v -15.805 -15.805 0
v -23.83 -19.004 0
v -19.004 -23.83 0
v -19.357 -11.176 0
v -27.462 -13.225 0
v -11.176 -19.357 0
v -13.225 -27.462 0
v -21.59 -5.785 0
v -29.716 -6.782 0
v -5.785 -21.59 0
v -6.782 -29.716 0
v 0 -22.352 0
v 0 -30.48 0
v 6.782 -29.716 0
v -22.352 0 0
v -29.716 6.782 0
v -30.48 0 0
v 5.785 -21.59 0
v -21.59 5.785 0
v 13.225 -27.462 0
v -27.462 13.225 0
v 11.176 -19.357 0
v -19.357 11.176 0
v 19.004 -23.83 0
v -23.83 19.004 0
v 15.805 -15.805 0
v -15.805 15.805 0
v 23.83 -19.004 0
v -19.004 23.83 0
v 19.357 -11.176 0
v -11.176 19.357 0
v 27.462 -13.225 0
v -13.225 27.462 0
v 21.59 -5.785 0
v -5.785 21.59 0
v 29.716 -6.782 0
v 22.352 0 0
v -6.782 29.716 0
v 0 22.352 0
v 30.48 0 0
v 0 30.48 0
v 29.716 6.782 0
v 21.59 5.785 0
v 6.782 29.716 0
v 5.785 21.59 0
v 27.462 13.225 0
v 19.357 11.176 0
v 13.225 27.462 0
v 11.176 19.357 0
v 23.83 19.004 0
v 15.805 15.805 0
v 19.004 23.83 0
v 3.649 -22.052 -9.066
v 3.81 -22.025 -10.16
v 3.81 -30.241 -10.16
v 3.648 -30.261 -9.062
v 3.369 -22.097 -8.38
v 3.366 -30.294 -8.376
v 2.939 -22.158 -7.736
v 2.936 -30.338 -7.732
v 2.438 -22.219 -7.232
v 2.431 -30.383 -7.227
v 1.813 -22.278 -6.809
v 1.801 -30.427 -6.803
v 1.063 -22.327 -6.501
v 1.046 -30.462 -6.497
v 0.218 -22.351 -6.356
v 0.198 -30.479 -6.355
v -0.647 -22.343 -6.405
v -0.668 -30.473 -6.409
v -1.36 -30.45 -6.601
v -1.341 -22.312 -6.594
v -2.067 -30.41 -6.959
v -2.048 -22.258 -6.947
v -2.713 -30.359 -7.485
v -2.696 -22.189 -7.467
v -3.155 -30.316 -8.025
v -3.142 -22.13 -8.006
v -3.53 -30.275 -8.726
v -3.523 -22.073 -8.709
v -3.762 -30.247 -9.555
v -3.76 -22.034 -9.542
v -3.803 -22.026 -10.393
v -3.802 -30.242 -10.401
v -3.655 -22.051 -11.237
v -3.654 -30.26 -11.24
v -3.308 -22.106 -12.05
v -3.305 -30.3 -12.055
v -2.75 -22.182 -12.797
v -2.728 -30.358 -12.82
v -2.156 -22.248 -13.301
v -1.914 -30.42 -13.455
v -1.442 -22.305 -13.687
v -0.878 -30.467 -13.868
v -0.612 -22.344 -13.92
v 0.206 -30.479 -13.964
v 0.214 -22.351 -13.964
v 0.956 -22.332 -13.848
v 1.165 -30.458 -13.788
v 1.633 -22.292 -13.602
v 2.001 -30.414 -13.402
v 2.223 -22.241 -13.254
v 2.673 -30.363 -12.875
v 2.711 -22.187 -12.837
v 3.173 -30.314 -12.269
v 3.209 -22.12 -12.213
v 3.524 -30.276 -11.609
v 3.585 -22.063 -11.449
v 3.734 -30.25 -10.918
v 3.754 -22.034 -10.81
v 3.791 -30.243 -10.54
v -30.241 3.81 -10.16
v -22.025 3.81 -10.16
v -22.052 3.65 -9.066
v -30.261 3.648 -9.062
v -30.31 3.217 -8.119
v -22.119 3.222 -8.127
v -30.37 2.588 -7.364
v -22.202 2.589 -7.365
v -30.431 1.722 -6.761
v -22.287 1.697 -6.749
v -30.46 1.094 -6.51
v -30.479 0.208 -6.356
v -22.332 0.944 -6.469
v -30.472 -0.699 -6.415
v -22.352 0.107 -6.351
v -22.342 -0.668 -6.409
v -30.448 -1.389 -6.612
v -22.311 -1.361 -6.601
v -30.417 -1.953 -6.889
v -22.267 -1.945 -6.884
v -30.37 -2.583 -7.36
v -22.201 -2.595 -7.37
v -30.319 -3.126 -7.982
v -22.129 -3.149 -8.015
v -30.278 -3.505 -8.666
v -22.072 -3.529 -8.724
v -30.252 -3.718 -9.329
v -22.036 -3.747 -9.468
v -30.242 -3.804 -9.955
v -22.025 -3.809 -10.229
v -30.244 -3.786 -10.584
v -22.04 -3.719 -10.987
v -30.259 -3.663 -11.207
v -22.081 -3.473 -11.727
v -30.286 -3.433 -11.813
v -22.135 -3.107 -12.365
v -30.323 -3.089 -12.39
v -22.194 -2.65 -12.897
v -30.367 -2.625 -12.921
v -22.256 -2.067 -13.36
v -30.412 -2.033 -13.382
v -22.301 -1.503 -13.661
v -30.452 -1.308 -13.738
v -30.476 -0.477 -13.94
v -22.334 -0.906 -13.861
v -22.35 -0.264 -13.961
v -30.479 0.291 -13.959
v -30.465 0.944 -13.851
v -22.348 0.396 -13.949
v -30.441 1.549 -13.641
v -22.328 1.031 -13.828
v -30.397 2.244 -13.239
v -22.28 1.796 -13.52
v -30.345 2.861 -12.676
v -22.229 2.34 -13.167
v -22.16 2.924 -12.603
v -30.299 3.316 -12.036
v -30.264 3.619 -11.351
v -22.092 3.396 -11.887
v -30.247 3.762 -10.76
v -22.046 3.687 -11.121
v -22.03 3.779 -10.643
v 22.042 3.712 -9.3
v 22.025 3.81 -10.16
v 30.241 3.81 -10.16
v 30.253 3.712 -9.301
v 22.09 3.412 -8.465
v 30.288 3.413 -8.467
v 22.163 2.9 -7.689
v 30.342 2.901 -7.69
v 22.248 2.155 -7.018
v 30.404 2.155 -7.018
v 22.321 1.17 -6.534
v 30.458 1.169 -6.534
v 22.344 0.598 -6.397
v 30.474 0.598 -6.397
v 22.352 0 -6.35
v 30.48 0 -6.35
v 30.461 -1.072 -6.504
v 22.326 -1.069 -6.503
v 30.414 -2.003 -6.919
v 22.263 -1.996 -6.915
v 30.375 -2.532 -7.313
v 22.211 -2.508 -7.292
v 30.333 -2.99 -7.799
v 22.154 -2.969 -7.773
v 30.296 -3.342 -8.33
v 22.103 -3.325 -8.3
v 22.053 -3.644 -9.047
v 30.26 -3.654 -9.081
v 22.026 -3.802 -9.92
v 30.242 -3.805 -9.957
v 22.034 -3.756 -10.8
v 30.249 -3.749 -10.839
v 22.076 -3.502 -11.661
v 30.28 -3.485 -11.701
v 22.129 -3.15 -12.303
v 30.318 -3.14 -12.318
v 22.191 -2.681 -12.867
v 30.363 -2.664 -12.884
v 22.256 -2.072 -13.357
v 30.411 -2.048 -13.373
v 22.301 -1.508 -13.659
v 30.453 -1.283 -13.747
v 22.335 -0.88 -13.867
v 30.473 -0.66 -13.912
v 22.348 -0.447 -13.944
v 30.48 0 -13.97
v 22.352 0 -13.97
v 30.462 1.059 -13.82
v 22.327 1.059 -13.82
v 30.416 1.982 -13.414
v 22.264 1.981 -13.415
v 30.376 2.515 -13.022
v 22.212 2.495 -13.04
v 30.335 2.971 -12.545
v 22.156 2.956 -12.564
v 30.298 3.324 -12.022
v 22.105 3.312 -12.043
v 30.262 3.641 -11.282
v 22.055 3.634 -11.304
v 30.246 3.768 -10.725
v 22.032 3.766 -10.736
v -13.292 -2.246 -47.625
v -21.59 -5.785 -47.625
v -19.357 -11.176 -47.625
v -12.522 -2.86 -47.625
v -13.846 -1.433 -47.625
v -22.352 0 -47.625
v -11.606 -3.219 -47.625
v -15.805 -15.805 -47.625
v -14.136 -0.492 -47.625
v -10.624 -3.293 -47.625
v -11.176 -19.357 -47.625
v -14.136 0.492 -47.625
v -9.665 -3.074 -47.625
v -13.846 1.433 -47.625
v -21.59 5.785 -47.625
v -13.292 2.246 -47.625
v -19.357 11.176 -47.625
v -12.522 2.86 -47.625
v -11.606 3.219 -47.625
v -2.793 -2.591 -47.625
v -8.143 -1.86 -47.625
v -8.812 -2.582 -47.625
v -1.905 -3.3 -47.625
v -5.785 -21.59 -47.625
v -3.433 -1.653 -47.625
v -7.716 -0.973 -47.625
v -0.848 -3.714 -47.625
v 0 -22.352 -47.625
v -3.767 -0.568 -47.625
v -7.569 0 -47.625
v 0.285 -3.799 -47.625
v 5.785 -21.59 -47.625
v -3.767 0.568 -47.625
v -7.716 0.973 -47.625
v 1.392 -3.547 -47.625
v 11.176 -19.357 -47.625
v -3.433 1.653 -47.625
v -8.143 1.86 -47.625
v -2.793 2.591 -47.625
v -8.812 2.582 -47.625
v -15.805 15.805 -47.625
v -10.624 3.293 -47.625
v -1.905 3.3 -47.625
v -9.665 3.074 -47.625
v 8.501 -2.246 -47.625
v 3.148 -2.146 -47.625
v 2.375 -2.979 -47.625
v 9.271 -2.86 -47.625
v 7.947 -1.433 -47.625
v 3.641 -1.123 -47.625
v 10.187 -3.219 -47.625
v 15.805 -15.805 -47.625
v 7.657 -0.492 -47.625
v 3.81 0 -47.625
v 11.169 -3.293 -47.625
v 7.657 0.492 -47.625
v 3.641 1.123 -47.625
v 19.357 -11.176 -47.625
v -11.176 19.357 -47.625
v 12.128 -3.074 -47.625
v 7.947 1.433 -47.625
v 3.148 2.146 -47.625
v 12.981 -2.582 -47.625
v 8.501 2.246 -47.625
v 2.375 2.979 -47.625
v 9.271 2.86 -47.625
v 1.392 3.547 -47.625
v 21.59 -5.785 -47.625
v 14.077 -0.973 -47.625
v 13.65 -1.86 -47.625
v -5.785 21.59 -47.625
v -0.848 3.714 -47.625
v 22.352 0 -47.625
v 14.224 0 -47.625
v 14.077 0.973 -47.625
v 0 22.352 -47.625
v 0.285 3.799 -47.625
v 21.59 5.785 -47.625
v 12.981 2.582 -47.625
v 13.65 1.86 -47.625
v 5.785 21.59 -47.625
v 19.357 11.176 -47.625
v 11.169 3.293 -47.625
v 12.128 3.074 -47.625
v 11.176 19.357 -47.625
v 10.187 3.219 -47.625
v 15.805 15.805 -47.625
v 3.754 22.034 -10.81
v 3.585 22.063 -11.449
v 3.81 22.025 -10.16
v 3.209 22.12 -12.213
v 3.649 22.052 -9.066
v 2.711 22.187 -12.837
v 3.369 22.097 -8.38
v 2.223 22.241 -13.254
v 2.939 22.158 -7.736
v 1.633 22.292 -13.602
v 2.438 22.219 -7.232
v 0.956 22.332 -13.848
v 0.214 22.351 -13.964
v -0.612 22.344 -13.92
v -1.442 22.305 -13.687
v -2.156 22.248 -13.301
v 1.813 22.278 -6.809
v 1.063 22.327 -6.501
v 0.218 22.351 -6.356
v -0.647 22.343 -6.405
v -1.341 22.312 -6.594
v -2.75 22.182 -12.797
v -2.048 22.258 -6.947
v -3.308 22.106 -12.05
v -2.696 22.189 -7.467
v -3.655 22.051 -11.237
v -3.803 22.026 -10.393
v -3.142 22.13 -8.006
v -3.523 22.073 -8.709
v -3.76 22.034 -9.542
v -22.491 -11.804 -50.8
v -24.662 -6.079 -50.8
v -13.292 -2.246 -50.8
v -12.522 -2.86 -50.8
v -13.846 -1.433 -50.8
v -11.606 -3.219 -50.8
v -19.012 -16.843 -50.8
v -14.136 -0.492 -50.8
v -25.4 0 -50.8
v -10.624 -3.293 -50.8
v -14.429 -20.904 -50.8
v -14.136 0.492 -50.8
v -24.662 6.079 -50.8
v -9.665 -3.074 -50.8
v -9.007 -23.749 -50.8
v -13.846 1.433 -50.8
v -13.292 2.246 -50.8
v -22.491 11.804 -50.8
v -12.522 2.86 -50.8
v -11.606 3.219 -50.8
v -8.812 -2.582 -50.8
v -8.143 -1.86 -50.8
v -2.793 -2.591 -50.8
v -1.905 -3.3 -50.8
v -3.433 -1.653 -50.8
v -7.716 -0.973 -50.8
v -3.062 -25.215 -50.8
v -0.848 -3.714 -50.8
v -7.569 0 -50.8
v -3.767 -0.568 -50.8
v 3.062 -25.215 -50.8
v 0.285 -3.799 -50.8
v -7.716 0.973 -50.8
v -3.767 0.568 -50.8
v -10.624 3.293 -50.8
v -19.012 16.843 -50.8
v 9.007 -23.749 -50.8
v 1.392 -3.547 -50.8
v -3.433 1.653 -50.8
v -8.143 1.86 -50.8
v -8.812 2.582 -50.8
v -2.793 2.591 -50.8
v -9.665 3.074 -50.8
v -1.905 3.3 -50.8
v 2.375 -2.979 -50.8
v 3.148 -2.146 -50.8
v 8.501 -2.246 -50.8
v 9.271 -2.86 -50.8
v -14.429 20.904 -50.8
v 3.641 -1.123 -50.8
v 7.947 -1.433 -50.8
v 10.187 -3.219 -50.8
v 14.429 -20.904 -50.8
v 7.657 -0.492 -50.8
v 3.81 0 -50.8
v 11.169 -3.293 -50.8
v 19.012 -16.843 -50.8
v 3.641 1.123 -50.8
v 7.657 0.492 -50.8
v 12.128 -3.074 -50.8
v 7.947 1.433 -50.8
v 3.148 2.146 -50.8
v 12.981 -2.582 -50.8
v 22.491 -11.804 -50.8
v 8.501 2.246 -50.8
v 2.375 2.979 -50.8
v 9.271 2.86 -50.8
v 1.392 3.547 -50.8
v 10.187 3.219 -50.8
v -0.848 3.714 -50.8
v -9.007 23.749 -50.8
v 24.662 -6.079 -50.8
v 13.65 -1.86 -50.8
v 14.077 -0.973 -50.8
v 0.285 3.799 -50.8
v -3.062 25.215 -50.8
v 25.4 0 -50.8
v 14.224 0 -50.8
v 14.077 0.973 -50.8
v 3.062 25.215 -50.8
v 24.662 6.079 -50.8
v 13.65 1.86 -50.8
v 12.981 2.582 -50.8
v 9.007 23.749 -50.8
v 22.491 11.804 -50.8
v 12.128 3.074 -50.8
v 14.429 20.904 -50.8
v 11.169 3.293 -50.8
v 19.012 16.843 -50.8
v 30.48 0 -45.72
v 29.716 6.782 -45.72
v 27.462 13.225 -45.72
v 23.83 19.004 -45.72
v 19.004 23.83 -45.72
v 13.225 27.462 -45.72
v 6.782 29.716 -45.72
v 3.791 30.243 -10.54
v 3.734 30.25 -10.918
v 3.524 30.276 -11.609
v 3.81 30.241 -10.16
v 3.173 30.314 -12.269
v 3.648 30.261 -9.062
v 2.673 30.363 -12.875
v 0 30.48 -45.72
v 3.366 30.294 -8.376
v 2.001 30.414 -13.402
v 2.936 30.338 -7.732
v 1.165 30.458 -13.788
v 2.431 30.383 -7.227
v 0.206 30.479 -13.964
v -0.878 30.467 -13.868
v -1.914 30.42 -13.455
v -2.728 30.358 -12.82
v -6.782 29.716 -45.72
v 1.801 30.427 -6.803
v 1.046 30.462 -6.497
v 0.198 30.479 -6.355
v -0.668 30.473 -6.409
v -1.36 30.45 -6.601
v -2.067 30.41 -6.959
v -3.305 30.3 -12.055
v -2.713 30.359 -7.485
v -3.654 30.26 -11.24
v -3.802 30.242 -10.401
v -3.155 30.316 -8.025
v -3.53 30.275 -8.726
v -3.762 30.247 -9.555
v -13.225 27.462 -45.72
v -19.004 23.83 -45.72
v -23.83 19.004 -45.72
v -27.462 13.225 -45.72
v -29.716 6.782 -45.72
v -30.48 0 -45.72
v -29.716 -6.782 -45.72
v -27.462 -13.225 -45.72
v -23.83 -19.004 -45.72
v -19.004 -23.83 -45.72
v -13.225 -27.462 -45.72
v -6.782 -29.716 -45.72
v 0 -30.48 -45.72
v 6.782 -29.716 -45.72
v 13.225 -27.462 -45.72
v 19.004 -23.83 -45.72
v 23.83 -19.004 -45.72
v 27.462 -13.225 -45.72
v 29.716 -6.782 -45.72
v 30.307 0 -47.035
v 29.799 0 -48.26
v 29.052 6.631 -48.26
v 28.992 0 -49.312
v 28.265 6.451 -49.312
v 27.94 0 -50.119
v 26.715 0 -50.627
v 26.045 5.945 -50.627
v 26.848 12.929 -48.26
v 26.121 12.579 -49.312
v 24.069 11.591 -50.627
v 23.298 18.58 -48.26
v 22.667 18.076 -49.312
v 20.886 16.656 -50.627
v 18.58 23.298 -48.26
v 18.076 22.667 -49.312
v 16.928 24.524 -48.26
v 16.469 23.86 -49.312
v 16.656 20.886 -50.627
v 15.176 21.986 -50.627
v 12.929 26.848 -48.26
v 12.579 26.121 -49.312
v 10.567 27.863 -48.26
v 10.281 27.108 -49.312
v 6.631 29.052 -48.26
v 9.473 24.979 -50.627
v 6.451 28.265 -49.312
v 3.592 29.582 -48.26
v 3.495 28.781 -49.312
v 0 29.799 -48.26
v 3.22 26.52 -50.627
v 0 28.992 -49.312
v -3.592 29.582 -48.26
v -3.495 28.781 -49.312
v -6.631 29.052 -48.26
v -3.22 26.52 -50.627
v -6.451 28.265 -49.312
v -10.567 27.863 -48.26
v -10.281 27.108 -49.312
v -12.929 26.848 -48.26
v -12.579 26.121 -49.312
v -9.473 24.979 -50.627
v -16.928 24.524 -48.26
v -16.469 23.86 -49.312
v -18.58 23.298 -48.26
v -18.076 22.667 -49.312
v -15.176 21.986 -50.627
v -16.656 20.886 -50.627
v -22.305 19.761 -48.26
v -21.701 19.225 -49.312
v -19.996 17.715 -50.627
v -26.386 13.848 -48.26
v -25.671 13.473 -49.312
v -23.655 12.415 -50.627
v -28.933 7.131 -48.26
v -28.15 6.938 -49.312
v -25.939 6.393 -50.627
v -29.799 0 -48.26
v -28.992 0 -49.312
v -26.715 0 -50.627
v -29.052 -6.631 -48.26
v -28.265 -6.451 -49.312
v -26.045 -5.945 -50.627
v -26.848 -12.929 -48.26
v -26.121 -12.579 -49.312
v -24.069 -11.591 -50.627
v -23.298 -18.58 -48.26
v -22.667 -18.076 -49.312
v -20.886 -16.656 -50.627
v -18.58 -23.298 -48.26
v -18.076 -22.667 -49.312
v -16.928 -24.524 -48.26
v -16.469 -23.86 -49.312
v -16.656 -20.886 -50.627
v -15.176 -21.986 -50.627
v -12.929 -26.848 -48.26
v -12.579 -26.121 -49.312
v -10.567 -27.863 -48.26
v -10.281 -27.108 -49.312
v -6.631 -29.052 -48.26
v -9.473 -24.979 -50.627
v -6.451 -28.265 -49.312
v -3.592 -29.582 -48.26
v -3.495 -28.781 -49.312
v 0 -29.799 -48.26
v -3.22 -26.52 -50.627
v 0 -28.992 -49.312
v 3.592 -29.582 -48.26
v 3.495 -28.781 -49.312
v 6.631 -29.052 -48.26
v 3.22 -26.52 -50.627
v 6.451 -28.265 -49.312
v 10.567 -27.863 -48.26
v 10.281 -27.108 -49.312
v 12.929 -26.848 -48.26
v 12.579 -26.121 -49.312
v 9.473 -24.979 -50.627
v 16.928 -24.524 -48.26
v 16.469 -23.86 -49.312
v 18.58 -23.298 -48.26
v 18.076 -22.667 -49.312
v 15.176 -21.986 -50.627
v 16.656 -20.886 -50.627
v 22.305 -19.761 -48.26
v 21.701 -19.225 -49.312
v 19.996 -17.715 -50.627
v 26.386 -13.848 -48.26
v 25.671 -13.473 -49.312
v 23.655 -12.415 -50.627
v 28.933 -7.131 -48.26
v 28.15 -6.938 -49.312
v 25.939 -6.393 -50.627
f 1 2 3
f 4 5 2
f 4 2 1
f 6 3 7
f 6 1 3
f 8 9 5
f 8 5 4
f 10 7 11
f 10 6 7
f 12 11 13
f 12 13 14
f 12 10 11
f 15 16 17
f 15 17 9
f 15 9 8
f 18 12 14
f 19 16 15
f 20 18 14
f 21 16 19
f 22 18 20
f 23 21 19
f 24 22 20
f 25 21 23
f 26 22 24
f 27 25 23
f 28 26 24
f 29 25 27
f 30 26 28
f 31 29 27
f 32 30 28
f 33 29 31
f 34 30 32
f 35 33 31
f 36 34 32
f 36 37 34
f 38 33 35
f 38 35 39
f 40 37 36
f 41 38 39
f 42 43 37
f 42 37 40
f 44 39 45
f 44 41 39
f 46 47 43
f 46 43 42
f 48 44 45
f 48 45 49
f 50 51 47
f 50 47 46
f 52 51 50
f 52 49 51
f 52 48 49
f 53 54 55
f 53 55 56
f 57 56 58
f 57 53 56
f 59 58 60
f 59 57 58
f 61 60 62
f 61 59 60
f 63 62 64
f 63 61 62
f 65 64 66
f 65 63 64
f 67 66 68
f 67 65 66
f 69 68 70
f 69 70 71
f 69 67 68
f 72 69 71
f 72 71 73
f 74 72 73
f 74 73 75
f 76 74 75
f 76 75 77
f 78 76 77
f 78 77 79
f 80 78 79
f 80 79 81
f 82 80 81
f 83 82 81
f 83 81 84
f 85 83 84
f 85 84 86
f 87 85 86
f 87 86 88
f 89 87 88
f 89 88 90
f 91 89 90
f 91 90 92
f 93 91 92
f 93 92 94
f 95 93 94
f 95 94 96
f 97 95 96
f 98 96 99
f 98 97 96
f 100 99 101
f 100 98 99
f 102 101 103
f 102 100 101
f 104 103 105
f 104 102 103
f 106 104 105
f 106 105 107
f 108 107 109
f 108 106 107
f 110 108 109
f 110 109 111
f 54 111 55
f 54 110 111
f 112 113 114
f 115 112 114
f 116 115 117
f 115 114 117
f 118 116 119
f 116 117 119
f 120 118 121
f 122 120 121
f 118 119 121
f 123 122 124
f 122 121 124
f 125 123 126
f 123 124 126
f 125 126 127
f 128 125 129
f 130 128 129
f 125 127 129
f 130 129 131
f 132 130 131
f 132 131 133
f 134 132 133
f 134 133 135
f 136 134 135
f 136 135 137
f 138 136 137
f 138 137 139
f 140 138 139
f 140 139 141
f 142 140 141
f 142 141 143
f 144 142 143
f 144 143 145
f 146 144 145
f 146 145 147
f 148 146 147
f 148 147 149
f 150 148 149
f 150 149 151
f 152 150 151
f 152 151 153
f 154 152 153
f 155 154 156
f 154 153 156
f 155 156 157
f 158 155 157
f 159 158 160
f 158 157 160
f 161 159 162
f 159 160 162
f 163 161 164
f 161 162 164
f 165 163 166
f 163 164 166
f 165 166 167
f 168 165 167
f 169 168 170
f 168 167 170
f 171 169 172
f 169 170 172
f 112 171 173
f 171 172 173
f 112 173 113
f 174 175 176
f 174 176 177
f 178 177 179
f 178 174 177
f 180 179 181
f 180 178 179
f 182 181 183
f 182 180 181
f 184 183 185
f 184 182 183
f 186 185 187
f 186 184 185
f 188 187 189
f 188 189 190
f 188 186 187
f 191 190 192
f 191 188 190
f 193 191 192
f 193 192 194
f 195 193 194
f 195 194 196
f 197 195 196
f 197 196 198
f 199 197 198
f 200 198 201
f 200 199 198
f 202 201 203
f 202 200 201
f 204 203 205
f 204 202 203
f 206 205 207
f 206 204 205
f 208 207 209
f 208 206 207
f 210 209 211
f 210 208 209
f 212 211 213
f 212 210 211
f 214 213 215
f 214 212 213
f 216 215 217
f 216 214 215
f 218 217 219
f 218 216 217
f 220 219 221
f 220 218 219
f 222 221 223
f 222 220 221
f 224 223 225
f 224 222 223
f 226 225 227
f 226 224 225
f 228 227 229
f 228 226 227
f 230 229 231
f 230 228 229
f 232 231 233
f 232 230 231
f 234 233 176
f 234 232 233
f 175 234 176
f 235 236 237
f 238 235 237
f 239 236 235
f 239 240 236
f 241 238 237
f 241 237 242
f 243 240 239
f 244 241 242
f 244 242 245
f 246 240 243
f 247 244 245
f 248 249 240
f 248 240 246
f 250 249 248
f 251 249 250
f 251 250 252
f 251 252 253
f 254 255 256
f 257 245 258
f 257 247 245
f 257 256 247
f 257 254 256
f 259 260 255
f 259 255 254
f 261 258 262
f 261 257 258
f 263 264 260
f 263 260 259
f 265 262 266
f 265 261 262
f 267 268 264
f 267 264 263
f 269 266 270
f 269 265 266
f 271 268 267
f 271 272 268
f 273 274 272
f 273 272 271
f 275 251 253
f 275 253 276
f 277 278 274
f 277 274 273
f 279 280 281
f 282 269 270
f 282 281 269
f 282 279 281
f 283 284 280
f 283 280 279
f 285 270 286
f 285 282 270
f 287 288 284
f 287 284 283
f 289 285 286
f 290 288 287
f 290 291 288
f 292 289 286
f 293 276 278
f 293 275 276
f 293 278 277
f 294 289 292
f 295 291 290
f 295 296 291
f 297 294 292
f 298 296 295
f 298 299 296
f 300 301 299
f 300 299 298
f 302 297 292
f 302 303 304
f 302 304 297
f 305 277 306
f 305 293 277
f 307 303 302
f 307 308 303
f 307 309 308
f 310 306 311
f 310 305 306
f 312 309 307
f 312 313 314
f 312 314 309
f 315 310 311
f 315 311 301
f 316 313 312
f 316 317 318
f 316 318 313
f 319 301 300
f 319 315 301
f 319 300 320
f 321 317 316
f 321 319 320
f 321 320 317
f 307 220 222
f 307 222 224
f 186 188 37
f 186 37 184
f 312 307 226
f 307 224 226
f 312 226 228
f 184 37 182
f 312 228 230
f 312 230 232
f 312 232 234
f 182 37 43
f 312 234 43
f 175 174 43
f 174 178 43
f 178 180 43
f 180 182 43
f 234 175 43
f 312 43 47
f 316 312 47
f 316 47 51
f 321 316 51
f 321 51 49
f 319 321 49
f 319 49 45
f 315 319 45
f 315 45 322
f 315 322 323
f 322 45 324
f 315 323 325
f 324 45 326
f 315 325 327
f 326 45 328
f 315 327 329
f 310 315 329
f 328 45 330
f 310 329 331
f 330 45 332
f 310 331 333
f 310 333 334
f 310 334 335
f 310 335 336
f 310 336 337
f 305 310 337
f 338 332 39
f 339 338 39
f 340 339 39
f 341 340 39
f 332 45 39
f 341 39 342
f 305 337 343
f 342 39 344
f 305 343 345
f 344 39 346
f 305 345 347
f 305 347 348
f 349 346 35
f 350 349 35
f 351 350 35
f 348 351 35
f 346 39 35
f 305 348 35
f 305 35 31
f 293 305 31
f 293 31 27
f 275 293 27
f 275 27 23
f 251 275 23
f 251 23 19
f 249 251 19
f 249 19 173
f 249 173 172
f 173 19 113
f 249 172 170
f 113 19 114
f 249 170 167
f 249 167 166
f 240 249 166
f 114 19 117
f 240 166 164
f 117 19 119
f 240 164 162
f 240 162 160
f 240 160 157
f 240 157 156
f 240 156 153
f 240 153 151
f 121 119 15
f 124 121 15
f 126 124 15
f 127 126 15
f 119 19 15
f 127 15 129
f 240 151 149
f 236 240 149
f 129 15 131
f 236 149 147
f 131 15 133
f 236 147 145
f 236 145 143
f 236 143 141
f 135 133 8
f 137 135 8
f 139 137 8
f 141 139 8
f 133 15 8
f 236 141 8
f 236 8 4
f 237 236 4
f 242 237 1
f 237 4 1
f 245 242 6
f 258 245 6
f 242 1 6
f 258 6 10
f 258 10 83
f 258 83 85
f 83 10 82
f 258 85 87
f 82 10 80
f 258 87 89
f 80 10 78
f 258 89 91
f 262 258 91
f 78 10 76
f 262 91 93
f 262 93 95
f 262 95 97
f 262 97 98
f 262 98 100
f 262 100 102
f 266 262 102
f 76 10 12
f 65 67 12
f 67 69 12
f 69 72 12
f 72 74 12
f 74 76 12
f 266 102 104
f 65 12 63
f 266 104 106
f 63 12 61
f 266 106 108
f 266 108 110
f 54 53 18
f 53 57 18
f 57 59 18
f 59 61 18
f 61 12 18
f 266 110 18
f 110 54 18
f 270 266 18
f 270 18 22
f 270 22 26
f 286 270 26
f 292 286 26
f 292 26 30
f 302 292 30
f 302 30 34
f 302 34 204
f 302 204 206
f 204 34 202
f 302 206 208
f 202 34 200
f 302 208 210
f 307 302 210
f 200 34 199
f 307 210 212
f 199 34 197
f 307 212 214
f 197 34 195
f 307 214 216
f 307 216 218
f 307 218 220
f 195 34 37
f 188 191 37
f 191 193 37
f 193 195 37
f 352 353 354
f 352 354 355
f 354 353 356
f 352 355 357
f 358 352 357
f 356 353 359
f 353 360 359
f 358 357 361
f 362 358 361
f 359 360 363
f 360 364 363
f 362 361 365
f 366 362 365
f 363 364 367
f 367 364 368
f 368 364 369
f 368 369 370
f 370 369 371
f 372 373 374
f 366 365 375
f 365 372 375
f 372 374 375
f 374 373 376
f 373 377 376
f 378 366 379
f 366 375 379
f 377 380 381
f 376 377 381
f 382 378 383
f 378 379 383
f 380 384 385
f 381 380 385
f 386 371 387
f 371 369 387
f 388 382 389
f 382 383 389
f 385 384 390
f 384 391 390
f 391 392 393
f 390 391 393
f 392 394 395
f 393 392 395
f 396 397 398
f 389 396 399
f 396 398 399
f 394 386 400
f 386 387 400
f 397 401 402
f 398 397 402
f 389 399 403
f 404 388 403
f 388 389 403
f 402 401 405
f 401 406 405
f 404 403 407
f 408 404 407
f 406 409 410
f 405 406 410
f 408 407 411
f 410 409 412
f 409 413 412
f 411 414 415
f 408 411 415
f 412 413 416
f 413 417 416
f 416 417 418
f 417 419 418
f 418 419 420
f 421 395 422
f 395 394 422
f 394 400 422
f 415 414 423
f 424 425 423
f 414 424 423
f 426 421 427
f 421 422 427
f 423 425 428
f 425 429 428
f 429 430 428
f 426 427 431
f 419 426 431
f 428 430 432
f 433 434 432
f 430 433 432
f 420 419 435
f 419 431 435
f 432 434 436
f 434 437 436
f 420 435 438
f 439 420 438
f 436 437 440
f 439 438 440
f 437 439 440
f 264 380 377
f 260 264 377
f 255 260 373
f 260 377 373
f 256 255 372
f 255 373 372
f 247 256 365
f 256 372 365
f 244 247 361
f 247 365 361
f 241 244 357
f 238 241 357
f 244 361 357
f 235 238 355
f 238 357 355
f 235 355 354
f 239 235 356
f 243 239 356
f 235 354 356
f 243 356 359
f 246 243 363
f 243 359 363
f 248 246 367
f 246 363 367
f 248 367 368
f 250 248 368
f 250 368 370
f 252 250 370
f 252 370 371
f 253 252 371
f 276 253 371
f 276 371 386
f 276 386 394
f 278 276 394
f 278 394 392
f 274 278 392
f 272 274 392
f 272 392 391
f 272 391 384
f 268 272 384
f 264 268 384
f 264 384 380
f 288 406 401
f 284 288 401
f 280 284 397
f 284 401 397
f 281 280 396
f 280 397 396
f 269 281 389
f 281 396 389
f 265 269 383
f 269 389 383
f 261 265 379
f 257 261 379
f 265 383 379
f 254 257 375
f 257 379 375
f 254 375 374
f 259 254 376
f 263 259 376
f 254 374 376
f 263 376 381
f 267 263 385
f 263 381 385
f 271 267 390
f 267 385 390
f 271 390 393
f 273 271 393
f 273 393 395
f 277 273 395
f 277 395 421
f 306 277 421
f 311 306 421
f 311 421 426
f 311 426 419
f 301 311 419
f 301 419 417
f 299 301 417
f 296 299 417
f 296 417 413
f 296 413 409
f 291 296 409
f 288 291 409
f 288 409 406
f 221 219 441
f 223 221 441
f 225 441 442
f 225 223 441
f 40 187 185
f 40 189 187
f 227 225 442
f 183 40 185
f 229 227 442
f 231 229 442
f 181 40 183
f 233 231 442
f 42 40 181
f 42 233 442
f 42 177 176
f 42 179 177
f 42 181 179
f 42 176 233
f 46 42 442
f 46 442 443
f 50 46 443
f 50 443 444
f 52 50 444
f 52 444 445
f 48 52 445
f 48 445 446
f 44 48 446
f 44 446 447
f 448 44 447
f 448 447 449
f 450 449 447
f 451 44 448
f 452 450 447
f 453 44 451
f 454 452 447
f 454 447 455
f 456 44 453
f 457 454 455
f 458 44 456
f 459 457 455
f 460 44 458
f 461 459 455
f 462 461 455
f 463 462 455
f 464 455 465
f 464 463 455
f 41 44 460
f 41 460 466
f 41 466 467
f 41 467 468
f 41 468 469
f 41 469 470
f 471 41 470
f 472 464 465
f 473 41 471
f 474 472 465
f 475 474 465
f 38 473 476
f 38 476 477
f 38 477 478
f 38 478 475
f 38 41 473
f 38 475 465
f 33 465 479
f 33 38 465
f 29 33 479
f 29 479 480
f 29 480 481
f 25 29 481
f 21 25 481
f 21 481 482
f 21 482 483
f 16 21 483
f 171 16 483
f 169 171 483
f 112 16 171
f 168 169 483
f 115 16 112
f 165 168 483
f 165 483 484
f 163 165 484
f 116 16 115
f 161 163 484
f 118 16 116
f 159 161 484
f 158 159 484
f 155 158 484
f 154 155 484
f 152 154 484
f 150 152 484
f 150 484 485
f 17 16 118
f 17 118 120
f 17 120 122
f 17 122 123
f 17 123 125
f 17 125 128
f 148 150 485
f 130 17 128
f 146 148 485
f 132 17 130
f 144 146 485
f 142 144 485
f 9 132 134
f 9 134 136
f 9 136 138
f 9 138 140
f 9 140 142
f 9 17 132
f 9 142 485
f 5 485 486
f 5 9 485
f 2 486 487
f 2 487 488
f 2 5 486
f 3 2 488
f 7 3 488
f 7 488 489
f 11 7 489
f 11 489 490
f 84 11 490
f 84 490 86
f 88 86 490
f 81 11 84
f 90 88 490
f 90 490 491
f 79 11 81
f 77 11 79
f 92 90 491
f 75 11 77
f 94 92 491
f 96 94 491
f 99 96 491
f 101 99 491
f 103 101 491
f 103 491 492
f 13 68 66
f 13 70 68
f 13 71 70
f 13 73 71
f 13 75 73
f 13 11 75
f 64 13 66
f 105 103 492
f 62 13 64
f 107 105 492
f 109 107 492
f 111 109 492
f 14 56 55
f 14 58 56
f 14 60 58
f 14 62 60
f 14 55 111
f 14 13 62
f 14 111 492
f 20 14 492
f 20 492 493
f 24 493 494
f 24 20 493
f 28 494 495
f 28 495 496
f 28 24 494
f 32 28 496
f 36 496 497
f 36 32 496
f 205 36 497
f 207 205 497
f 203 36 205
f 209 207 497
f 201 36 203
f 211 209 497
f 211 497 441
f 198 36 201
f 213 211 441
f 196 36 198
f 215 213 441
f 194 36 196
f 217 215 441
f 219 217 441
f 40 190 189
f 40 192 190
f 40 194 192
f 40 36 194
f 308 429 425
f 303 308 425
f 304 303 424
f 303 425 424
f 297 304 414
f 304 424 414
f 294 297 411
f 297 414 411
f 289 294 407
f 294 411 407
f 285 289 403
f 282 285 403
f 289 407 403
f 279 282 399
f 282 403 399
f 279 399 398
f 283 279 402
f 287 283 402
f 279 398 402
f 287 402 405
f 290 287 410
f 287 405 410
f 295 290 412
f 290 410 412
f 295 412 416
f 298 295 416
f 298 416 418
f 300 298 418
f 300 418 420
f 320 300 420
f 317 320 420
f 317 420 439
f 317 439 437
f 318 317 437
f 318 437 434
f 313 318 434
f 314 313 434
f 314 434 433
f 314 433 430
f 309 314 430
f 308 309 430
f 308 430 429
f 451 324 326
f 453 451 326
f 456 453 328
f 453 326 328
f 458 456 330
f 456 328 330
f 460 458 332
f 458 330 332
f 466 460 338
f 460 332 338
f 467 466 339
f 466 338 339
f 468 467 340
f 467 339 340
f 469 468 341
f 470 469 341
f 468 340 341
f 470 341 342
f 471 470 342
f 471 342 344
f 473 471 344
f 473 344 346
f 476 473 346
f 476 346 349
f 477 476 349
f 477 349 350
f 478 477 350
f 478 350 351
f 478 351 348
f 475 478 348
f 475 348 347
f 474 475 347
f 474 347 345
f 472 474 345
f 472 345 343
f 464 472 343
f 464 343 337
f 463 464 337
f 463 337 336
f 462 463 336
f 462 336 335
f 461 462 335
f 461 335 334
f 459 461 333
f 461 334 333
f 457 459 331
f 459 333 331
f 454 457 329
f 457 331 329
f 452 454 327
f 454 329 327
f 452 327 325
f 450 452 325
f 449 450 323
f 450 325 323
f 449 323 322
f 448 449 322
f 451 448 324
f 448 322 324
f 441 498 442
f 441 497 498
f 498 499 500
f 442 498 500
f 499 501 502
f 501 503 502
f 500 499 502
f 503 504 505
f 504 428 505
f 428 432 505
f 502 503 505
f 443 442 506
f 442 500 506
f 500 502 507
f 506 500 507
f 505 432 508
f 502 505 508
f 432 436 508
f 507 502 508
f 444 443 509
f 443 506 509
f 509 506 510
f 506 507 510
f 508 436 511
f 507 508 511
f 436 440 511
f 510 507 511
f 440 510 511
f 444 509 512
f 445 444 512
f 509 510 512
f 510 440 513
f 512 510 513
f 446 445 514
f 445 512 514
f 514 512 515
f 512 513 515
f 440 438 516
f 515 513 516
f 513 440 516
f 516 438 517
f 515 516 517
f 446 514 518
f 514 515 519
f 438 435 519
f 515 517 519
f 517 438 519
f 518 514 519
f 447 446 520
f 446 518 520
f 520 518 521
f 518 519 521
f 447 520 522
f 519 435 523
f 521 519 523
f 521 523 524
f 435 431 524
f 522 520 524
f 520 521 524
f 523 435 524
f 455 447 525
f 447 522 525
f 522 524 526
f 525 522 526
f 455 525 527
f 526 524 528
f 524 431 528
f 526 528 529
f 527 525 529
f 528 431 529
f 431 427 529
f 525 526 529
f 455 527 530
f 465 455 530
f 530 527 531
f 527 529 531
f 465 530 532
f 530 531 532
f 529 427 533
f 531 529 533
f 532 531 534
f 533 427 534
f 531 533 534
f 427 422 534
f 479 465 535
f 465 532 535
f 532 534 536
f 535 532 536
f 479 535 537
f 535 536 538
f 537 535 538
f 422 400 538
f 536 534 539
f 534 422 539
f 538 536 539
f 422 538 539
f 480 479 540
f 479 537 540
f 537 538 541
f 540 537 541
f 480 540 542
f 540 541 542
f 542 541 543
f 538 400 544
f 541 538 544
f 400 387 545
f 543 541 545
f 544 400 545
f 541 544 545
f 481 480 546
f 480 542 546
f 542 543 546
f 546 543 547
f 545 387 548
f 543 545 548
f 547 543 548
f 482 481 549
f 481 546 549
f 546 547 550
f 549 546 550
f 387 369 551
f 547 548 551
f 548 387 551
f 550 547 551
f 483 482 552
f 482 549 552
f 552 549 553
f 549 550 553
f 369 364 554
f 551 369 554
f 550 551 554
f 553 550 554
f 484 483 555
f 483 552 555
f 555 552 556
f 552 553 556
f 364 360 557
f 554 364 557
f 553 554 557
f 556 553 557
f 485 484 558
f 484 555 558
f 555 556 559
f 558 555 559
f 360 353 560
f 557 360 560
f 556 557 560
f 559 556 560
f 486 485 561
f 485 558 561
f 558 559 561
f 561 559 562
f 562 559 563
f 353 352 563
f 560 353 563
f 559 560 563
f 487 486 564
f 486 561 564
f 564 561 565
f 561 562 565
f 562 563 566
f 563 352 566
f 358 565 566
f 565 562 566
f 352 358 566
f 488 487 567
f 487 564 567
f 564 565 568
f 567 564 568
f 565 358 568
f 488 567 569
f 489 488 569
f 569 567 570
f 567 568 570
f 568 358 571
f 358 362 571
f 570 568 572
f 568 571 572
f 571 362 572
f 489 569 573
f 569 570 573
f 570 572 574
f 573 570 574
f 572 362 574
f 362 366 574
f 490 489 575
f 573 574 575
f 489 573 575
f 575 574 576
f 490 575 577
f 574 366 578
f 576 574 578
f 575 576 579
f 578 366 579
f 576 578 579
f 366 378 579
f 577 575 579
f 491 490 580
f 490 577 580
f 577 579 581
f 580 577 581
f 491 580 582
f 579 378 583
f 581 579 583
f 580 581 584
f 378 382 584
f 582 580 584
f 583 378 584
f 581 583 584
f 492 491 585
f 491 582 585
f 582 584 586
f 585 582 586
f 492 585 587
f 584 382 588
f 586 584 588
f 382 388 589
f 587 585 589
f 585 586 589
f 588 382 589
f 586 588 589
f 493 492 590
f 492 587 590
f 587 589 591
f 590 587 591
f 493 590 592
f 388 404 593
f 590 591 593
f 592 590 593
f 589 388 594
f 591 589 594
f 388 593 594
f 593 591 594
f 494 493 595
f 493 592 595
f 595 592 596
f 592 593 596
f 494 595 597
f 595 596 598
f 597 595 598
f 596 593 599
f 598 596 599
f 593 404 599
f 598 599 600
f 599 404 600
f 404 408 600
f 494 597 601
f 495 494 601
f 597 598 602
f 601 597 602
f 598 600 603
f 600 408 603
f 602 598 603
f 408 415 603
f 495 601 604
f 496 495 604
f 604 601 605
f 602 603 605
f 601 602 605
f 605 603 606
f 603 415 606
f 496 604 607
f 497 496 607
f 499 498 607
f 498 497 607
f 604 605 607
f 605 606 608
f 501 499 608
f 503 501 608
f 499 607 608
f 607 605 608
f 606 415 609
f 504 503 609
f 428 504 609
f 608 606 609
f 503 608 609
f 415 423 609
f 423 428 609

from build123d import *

# Parameters (mm, degrees)
F0_R          = 30.48
F1_DEPTH      = 50.8
F2_R          = 3.81
F3_DEPTH      = 50.801
F4_R          = 3.81
F5_DEPTH      = 30.481
F5_DEPTH_BACK = 30.481
F6_R          = 3.81
F7_DEPTH      = 30.4810001
F7_DEPTH_BACK = 30.4810001
F8_R          = 3.302
F9_DEPTH      = 50.8010001
F10_R         = 22.352
F11_DEPTH     = 47.625
F12_R         = 5.08


with BuildPart() as f1:
    # F0 (on Top) → F1 (new body)
    with BuildSketch(Plane.XY):
        Circle(F0_R)
    extrude(amount=-F1_DEPTH)

    # F2 (on face) → F3 (cut, through all)
    with BuildSketch(Plane(origin=(0, 0, -50.8), x_dir=(1, 0, 0), z_dir=(0, 0, -1))):
        Circle(F2_R)
    extrude(amount=-F3_DEPTH, mode=Mode.SUBTRACT)

    # F4 (on Right) → F5 (cut, two sides)
    with BuildSketch(Plane.YZ) as f5_sk:
        with Locations((0, -10.16)):
            Circle(F4_R)
    extrude(amount=-F5_DEPTH, mode=Mode.SUBTRACT)
    extrude(f5_sk.sketch, amount=F5_DEPTH_BACK, mode=Mode.SUBTRACT)

    # F6 (on Front) → F7 (cut, two sides)
    with BuildSketch(Plane.XZ) as f7_sk:
        with Locations((0, -10.16)):
            Circle(F6_R)
    extrude(amount=-F7_DEPTH, mode=Mode.SUBTRACT)
    extrude(f7_sk.sketch, amount=F7_DEPTH_BACK, mode=Mode.SUBTRACT)

    # F8 (on face) → F9 (cut, through all)
    with BuildSketch(Plane(origin=(0, 0, -50.8), x_dir=(1, 0, 0), z_dir=(0, 0, -1))):
        with Locations((10.922, 0)):
            Circle(F8_R)
        with Locations((-10.8710342307, 0)):
            Circle(F8_R)
    extrude(amount=-F9_DEPTH, mode=Mode.SUBTRACT)

    # F10 (on face) → F11 (cut)
    with BuildSketch(Plane.XY):
        Circle(F10_R)
    extrude(amount=-F11_DEPTH, mode=Mode.SUBTRACT)

    # F12
    f12_edges = [f1.edges().sort_by_distance(p)[0] for p in [
        (-30.48, 0, -50.8),
    ]]
    fillet(f12_edges, radius=F12_R)


solid = f1.part
